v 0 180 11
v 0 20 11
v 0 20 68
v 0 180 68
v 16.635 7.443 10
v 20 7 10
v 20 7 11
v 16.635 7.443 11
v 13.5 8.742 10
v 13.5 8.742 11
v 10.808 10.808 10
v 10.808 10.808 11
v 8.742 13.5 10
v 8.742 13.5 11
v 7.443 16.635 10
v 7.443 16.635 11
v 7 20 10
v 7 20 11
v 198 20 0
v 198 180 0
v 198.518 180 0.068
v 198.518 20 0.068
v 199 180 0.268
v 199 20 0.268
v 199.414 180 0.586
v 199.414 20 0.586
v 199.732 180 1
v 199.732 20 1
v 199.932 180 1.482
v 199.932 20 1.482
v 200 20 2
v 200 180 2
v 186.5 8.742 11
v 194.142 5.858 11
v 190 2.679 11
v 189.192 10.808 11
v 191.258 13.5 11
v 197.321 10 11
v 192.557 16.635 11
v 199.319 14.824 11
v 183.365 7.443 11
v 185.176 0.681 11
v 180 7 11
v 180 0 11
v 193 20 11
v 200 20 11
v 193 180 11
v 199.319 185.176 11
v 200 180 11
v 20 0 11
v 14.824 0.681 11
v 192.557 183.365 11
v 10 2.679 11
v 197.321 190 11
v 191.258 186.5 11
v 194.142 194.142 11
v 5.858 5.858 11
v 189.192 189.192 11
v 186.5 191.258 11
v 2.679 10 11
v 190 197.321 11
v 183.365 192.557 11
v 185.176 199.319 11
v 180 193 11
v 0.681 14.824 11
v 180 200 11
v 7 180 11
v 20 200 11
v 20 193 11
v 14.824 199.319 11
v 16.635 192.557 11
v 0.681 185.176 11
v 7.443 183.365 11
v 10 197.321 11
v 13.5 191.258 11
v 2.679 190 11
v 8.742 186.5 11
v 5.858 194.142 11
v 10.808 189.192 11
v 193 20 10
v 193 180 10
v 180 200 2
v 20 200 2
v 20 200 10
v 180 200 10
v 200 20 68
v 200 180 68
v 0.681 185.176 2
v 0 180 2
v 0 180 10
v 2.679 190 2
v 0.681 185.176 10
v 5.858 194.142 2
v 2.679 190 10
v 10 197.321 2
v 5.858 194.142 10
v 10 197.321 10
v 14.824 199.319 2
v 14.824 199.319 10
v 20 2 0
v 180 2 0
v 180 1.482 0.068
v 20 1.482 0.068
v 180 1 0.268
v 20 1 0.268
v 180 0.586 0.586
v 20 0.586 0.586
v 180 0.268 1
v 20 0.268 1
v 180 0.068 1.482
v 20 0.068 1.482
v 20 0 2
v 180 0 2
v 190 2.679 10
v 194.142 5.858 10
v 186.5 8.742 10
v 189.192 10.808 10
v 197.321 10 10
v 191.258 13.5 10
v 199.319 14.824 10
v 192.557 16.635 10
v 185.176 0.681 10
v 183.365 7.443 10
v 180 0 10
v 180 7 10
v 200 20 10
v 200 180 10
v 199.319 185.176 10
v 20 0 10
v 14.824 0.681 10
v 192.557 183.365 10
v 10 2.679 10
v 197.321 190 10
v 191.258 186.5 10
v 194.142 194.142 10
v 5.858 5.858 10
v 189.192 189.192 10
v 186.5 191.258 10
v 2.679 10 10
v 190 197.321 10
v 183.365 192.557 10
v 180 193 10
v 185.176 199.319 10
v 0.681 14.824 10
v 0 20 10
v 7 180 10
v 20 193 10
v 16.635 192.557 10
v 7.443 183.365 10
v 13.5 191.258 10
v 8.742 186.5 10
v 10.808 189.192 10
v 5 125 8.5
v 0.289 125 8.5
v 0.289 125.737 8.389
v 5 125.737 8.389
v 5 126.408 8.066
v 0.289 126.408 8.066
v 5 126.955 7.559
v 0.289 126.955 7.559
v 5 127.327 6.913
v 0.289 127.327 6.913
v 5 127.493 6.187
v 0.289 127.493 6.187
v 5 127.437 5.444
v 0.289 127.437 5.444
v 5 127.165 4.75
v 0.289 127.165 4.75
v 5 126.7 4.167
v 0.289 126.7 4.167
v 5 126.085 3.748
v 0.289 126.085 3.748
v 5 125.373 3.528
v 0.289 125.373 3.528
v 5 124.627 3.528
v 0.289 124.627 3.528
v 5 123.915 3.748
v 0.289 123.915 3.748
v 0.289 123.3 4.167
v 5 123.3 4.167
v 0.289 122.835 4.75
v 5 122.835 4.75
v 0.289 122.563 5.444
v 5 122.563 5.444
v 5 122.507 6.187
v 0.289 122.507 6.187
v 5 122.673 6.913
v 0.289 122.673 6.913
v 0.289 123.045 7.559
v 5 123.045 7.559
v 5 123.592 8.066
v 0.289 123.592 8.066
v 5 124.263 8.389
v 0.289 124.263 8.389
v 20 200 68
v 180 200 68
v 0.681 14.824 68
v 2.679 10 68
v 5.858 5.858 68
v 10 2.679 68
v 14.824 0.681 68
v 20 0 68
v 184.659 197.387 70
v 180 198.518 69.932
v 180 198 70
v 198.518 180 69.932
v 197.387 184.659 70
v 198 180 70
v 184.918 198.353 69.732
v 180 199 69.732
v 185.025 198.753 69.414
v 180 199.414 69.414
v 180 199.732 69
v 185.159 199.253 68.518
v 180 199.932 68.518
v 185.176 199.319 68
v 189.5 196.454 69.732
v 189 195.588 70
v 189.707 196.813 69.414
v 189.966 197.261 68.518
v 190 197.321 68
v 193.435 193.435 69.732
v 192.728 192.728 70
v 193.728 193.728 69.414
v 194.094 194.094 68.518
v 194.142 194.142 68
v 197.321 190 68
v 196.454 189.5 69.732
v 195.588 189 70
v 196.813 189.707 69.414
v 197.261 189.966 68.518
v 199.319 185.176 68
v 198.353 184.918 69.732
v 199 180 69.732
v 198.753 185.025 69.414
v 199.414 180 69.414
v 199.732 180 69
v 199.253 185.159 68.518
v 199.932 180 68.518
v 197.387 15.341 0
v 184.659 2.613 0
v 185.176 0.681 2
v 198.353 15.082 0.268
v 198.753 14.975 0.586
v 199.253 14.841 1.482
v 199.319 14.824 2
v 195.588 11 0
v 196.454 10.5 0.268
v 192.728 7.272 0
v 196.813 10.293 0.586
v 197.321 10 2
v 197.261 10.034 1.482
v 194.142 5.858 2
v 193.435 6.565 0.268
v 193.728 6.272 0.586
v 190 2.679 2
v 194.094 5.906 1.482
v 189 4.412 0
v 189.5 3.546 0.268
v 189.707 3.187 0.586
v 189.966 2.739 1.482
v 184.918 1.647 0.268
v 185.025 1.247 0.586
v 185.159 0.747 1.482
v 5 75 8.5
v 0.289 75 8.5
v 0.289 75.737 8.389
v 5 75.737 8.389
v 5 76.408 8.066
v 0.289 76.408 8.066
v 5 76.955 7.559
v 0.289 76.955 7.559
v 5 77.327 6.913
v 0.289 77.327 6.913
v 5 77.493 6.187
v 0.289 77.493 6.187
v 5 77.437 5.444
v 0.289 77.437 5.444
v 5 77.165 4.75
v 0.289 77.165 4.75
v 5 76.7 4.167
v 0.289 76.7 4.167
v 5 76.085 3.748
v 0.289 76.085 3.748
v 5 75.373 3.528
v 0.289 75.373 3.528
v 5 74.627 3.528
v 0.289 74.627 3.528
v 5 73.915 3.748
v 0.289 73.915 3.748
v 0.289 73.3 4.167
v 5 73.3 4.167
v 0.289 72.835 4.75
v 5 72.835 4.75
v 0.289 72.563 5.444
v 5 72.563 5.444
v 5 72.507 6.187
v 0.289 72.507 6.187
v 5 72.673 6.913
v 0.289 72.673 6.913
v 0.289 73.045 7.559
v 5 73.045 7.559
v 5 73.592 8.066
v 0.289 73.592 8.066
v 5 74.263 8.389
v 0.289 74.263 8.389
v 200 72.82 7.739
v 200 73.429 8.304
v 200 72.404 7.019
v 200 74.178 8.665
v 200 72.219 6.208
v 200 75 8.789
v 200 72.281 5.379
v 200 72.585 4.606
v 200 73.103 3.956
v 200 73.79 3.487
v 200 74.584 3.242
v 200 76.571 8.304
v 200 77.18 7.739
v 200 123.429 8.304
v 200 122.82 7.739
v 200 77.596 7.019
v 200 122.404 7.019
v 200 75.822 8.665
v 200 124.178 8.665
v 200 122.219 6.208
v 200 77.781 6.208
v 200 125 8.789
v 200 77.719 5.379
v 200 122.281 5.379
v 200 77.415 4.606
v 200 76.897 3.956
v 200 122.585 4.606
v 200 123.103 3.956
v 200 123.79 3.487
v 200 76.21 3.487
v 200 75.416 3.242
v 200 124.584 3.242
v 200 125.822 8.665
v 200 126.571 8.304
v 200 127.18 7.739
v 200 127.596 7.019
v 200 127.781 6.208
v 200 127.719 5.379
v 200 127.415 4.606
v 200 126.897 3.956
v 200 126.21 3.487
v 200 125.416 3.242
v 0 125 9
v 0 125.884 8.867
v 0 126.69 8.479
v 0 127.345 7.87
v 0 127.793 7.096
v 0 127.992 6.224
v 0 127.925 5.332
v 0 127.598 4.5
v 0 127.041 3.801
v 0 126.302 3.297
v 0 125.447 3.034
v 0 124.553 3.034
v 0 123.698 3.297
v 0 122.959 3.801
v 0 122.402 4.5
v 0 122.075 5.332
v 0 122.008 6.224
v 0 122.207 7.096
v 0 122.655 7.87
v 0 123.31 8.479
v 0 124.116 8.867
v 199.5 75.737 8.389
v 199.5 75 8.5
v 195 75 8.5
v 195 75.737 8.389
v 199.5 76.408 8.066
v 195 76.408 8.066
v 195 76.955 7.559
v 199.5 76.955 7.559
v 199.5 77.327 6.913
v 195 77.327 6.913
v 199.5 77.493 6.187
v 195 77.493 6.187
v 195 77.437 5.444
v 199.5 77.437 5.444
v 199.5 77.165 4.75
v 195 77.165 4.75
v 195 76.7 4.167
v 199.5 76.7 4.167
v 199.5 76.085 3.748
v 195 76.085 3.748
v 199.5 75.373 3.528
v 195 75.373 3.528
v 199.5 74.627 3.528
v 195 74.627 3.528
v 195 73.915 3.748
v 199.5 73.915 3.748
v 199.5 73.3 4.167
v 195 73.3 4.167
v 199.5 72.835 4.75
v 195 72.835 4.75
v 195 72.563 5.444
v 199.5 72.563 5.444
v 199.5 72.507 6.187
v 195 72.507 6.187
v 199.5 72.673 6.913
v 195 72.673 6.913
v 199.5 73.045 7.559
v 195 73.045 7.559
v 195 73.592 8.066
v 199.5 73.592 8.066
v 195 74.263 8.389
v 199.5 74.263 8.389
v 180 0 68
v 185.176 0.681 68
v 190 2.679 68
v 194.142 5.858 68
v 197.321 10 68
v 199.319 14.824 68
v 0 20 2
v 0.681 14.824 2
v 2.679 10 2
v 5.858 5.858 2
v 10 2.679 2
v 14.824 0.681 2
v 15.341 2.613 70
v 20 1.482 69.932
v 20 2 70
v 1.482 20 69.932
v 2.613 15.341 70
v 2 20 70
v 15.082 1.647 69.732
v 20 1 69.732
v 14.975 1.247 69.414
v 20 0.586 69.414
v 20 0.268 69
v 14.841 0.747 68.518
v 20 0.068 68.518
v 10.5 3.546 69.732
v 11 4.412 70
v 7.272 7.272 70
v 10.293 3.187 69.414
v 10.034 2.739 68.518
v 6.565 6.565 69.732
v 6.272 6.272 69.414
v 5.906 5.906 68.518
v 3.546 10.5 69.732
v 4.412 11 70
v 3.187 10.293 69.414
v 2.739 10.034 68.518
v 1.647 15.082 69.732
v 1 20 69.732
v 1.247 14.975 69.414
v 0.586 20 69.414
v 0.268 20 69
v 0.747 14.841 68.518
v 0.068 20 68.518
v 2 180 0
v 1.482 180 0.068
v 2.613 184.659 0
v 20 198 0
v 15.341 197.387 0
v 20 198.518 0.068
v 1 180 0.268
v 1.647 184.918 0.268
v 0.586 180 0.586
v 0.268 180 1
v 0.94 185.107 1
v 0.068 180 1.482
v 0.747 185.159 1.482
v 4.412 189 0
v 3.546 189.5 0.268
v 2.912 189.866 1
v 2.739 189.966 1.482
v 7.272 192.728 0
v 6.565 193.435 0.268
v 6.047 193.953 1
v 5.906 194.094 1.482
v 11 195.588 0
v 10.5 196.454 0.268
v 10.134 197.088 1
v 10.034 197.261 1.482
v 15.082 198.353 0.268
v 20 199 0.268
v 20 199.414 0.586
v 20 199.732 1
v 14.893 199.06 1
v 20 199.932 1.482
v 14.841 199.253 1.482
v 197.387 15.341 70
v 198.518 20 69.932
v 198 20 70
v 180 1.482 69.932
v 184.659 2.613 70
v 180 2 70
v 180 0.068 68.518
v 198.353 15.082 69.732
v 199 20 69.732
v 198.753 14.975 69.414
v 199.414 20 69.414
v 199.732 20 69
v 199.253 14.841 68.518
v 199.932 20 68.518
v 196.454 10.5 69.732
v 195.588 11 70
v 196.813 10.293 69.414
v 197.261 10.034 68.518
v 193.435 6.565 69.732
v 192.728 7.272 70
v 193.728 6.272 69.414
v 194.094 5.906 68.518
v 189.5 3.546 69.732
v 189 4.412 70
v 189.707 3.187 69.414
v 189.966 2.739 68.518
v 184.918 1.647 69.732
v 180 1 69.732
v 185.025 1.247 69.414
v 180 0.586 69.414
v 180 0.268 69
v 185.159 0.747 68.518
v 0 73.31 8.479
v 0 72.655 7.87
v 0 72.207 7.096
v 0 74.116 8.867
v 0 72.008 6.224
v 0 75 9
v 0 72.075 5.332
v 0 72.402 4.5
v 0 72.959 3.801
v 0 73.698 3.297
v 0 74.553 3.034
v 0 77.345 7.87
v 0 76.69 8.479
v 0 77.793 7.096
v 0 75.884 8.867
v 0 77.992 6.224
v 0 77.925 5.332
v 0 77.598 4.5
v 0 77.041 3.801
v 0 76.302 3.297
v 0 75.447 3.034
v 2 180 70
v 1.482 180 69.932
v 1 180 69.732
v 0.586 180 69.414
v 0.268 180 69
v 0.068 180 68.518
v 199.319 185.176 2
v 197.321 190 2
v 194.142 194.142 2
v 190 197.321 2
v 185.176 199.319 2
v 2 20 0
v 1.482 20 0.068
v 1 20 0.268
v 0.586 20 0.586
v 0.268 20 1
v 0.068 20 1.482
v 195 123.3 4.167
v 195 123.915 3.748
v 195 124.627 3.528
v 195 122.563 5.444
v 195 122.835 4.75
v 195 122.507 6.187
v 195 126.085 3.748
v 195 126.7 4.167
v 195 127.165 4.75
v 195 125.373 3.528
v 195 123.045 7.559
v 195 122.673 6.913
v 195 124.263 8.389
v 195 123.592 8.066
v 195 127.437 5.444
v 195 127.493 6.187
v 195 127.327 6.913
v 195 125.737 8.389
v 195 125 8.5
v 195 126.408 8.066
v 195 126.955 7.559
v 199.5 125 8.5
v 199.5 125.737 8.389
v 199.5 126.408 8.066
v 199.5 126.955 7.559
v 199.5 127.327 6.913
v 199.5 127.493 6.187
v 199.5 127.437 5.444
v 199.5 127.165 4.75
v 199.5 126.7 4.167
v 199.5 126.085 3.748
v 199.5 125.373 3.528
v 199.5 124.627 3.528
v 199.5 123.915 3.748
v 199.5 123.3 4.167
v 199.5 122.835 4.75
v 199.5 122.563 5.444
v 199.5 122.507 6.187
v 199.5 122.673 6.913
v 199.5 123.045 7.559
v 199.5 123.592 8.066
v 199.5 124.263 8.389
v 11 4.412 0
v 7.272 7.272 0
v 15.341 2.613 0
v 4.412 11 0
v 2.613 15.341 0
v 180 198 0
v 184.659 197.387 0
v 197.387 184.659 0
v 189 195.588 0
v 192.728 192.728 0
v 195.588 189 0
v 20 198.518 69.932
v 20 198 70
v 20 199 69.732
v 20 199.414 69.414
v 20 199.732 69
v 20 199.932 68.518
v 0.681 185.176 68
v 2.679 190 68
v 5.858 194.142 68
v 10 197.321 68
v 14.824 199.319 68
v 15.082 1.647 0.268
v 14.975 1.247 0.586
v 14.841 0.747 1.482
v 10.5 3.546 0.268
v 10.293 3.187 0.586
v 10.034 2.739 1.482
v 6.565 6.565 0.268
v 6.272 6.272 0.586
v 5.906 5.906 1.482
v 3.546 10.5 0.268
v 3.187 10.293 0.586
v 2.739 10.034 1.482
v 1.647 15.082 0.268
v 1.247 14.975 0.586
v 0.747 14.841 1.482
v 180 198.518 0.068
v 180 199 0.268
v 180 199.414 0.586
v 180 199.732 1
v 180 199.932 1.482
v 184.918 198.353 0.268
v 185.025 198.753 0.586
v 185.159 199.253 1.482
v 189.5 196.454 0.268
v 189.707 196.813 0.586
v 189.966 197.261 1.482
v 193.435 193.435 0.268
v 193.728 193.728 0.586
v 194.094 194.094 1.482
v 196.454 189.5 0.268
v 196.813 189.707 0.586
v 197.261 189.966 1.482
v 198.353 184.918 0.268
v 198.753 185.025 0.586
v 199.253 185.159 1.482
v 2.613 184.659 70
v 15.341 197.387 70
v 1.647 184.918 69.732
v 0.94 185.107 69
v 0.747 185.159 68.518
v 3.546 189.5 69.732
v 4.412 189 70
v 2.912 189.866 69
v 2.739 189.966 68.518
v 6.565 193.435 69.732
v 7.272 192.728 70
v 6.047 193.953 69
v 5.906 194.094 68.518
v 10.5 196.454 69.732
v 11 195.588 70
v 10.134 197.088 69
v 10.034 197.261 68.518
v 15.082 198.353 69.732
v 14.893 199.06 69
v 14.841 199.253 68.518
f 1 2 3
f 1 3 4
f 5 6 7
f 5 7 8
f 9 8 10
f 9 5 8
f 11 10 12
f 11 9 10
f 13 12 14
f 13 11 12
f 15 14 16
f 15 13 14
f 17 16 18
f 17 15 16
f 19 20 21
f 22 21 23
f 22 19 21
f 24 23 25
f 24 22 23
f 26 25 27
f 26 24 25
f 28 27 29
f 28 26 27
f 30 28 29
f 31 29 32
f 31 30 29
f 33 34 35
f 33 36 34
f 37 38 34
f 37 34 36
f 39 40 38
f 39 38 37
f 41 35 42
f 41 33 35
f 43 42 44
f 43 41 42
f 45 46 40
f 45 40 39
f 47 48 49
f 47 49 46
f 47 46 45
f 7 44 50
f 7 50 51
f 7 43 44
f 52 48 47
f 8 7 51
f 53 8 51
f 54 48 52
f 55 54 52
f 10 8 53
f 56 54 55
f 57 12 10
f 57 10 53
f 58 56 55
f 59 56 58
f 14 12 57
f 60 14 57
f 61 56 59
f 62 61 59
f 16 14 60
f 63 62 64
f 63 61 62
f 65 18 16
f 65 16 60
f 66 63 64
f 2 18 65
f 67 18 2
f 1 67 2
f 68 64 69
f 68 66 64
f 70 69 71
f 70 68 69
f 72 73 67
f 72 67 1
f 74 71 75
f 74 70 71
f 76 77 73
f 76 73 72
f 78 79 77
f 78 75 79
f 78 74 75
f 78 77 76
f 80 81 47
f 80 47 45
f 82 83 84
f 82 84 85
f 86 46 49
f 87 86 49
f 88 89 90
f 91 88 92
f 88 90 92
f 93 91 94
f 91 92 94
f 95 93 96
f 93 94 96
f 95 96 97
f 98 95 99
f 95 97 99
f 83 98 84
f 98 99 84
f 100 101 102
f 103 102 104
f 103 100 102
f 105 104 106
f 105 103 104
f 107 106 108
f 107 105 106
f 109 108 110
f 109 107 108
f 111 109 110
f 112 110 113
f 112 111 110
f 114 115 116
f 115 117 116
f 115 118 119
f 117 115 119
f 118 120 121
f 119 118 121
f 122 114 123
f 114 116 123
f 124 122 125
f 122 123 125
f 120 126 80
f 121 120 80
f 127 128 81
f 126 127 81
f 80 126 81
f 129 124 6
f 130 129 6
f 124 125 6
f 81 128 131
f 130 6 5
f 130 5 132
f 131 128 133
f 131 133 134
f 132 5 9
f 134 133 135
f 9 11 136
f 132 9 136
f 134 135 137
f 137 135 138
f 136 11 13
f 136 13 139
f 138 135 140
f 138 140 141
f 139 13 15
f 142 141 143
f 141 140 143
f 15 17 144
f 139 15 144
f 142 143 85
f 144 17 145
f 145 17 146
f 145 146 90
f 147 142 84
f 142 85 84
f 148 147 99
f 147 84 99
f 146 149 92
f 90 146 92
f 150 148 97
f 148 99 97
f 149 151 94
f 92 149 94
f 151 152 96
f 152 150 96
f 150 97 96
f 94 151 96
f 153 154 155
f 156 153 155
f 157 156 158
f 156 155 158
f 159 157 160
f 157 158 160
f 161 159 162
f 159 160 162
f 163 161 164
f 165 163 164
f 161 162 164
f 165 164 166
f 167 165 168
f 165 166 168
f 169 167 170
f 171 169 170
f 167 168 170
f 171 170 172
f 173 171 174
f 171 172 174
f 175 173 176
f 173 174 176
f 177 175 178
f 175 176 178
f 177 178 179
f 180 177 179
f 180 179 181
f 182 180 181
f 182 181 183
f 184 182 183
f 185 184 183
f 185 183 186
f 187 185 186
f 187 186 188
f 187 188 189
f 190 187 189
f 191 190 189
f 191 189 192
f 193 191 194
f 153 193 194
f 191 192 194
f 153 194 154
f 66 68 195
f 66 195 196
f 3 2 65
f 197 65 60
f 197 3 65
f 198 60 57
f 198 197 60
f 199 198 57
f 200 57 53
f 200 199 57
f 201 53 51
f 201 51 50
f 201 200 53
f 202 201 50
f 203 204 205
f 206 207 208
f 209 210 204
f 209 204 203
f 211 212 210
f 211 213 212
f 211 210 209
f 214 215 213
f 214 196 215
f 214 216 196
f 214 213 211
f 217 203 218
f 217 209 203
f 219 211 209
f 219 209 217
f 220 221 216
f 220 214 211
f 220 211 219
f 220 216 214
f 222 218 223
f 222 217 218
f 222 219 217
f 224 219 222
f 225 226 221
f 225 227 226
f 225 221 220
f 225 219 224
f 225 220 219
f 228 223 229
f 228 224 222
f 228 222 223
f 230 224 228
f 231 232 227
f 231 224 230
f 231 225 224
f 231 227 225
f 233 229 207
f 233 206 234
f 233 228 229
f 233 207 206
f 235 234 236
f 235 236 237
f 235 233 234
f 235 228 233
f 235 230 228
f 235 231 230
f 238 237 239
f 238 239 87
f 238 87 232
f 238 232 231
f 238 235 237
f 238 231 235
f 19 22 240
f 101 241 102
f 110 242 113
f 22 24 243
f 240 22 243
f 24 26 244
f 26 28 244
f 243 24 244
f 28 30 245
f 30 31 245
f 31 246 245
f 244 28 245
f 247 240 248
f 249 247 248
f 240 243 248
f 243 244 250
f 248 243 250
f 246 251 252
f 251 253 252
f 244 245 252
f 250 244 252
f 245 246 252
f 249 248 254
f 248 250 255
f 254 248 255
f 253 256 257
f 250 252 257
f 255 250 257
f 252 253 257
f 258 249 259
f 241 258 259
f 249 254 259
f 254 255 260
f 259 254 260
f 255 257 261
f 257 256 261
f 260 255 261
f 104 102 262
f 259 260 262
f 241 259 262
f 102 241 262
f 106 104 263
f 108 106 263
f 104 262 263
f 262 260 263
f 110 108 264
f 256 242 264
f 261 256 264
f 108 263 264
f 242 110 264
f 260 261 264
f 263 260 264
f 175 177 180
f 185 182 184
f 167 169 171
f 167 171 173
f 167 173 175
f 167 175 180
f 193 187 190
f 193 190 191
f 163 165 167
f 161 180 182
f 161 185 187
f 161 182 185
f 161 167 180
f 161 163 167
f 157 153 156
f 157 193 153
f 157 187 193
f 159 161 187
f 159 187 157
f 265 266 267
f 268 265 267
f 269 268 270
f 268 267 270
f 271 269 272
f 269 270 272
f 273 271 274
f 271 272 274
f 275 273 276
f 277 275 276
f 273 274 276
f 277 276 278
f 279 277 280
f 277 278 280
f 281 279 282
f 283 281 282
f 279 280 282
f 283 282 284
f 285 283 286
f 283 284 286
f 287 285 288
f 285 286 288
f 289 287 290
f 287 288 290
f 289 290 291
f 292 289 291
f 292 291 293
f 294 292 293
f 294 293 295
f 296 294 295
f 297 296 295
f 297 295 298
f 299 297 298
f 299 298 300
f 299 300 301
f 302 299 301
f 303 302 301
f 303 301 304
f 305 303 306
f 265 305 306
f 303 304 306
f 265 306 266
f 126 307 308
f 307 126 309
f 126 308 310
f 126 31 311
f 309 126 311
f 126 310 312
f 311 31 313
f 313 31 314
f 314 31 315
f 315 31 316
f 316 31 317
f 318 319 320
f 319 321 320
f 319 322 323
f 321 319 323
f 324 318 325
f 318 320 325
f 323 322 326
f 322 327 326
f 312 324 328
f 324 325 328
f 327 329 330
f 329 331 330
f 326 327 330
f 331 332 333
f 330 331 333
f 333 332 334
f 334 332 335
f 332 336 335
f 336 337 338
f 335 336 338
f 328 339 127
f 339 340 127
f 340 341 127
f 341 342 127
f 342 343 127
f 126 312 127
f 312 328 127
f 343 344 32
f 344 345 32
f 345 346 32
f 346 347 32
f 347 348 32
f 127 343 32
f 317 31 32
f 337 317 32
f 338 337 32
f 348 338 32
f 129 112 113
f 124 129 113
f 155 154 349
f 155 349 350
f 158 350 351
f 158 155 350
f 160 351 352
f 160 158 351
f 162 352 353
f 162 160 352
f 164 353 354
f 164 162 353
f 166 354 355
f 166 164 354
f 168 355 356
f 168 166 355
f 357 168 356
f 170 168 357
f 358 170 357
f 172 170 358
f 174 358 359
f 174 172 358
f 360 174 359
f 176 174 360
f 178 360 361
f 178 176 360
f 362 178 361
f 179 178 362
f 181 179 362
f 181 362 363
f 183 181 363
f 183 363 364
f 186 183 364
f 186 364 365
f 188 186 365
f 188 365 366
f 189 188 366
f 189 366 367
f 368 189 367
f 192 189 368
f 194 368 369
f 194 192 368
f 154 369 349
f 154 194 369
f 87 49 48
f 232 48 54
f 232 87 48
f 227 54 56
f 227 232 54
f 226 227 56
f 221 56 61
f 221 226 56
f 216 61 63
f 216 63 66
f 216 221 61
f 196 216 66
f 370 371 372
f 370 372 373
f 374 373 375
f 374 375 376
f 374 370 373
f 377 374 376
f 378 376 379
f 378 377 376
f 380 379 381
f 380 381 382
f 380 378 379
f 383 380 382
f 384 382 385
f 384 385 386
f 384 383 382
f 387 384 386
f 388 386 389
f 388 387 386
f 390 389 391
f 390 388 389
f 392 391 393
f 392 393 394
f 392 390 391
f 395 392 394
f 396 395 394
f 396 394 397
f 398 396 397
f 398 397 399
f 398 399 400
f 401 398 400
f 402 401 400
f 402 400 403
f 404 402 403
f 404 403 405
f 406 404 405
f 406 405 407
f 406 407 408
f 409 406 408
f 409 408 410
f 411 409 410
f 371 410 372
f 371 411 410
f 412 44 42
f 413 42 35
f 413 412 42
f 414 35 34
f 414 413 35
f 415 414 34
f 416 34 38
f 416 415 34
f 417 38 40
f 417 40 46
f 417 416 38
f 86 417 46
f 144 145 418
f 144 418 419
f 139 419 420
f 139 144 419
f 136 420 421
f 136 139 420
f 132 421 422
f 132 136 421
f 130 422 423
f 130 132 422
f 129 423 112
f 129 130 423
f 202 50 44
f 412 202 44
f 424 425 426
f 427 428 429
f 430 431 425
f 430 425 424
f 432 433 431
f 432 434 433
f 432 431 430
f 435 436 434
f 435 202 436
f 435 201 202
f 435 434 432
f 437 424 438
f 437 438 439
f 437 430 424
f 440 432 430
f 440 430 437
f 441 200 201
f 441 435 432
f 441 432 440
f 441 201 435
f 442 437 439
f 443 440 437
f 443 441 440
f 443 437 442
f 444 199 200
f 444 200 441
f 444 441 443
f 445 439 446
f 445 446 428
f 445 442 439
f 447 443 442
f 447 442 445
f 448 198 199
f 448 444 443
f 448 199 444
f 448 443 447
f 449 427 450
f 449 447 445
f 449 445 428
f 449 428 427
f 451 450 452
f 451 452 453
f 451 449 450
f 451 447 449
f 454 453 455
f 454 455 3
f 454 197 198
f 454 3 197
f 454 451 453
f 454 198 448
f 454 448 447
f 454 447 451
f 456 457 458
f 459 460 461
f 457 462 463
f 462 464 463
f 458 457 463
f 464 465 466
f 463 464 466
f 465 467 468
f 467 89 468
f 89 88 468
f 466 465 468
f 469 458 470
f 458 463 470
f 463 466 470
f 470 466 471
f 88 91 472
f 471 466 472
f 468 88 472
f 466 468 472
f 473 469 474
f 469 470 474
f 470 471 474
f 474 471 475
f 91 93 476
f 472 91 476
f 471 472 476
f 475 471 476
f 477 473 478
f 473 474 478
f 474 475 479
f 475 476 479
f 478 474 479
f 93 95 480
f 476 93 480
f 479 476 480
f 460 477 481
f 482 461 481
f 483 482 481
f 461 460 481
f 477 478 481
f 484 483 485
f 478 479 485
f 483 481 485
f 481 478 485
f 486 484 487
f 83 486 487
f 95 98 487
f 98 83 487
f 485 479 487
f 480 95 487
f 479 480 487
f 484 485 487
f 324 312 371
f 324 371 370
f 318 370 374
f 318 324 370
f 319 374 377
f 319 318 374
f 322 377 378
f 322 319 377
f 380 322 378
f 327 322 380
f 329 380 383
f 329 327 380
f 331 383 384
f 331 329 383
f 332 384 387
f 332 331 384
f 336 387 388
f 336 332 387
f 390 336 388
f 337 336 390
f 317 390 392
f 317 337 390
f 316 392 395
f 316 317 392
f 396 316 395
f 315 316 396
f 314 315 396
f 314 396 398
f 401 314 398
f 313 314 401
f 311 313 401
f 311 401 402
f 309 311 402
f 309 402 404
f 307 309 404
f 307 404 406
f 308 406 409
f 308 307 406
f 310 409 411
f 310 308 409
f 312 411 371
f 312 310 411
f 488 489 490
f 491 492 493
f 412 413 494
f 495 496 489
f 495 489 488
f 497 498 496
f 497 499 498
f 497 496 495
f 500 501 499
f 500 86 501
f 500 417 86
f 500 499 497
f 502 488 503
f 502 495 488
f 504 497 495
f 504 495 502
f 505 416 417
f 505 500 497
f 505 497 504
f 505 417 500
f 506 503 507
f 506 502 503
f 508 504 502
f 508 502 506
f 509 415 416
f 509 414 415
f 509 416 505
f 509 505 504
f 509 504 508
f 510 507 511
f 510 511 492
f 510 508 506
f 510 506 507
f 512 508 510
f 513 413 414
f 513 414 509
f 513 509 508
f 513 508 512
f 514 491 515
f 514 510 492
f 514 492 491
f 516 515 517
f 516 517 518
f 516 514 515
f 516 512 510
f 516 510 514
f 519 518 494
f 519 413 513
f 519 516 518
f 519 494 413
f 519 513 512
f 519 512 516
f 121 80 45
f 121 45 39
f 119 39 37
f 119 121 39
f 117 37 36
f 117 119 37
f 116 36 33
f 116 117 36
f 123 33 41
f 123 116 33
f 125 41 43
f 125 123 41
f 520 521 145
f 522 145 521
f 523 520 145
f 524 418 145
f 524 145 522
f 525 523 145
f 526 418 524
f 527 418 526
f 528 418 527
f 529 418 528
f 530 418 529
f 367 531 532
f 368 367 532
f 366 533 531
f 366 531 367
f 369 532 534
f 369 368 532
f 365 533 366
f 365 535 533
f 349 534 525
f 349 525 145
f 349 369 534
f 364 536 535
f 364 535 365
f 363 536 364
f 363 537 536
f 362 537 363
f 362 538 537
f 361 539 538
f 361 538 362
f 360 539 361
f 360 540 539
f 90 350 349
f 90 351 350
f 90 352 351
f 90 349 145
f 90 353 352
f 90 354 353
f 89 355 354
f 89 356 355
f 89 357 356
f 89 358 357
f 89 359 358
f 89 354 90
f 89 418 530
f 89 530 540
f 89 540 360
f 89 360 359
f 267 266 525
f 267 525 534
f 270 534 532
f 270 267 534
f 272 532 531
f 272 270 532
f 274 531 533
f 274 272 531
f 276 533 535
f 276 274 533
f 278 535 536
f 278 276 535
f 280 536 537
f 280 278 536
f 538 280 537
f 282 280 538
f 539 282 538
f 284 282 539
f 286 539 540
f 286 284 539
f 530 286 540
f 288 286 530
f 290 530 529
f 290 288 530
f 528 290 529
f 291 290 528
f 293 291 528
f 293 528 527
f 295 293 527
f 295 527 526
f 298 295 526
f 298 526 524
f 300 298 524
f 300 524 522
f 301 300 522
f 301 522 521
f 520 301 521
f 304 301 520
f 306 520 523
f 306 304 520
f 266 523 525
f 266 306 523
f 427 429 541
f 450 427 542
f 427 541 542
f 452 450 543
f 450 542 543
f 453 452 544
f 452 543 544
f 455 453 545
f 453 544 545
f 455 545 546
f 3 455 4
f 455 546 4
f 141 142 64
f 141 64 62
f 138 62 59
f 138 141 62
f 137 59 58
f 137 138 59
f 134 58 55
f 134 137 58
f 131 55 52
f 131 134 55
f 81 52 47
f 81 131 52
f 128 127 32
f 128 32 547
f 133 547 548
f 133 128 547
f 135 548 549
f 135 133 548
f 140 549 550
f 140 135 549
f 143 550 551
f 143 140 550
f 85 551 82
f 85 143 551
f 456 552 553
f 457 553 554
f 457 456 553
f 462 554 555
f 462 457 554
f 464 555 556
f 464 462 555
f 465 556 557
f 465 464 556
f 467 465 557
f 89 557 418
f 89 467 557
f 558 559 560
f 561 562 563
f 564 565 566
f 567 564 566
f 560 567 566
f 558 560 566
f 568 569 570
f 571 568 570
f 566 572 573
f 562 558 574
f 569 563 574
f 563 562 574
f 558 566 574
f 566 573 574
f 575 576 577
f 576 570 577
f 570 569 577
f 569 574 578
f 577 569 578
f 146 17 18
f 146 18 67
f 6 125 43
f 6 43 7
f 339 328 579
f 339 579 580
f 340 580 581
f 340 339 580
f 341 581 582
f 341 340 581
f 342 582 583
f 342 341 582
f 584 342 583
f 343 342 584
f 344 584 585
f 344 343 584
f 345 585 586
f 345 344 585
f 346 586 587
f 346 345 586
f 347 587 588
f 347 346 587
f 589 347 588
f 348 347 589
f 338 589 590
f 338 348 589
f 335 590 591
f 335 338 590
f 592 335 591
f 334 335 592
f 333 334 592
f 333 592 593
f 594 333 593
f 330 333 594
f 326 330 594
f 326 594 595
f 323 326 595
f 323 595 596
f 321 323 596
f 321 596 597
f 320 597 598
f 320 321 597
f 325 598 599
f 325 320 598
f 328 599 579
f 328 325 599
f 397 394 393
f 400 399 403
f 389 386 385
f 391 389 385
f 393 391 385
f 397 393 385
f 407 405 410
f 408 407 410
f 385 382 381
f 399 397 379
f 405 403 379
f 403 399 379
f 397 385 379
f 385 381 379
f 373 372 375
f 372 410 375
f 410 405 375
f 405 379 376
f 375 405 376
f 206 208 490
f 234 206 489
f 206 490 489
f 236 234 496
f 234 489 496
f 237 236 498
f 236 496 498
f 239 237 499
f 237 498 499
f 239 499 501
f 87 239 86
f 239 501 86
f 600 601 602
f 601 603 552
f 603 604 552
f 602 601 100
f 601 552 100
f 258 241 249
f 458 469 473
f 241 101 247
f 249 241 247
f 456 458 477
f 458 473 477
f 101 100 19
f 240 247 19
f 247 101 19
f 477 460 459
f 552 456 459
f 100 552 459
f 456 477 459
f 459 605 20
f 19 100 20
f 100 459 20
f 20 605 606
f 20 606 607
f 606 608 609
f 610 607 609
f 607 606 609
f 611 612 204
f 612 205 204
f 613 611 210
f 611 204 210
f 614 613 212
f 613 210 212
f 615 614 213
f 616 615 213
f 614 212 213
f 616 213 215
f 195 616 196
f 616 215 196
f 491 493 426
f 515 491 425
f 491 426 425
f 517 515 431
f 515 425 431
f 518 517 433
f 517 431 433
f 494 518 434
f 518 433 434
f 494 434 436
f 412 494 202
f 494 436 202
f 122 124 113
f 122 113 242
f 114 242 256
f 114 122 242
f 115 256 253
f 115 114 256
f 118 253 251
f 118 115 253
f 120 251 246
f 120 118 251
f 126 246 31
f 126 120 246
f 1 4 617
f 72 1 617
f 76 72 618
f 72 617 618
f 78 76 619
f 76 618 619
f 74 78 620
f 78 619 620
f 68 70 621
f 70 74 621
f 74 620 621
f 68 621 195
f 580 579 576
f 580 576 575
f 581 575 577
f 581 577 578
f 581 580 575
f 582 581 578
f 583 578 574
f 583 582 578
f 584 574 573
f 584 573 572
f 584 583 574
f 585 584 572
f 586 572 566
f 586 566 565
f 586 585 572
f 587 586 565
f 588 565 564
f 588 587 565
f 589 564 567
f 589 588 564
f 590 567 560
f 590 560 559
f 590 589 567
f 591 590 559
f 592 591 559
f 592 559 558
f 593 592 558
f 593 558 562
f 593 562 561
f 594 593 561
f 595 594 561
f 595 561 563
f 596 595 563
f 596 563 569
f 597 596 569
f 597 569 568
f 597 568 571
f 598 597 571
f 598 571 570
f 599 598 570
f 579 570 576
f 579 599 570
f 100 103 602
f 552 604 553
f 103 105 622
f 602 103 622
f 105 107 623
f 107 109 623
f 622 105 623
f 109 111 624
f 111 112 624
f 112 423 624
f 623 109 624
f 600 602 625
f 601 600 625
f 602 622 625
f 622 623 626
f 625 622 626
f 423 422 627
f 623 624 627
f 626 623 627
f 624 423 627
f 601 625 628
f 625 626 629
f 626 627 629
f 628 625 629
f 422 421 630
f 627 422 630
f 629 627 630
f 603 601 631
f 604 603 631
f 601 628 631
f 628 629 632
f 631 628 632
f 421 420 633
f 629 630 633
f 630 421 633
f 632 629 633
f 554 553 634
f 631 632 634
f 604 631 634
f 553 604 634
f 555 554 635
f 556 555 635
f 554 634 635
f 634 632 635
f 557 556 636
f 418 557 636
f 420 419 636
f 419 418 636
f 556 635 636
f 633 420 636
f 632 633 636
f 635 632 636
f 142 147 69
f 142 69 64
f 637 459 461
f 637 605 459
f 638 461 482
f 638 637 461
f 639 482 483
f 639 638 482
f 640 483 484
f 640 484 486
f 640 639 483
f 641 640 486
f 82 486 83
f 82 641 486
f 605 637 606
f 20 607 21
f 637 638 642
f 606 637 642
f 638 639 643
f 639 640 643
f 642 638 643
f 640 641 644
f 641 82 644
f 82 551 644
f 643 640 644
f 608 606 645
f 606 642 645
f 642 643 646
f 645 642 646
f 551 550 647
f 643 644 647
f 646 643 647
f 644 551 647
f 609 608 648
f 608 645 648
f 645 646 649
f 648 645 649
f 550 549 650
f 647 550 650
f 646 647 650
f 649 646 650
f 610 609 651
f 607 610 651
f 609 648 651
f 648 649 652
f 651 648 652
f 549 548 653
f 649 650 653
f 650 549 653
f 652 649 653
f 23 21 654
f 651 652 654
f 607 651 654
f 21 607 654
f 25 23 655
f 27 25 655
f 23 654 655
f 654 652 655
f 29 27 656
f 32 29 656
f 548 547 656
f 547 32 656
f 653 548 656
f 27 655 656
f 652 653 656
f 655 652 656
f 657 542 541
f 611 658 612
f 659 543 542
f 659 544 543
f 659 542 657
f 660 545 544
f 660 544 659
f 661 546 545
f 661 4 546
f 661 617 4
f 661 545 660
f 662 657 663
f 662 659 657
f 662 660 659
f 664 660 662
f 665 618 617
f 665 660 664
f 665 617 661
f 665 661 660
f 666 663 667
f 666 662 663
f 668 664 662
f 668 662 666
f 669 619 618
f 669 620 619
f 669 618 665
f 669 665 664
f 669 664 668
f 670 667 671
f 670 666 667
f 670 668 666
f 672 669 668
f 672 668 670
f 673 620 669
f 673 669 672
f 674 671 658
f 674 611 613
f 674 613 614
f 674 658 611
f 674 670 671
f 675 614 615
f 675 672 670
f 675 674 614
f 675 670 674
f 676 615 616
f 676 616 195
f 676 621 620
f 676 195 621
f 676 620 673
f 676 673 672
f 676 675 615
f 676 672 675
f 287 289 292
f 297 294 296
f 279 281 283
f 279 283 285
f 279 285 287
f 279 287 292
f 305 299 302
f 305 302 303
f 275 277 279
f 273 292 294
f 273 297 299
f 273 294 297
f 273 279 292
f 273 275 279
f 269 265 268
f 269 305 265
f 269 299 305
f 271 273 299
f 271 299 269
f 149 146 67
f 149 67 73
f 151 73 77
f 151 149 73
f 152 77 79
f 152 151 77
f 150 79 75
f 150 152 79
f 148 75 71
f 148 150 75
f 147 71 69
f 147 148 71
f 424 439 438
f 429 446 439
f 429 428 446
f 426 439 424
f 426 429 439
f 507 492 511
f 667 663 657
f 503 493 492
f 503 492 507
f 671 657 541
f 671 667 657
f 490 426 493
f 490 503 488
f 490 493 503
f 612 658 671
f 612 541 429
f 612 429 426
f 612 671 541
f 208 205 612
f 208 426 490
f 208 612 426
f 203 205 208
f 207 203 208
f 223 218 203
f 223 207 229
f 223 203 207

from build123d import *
from OCP.BRepFilletAPI import BRepFilletAPI_MakeChamfer

# Parameters (mm, degrees)
SKETCH1_W           = 200
SKETCH1_H           = 200
BOSS_EXTRUDE1_DEPTH = 70
FILLET1_R           = 20
FILLET2_R           = 2
SKETCH2_W           = 230.455547831
SKETCH2_H           = 230.807926345
CUT_EXTRUDE1_DEPTH  = 1
SKETCH3_R           = 2.5
CUT_EXTRUDE2_DEPTH  = 5
CHAMFER1_SIZE       = 0.5
CHAMFER1_SIZE2      = 0.288675135
CHAMFER2_SIZE       = 0.5
CHAMFER2_SIZE2      = 0.288675135


with BuildPart() as part:
    # Sketch1 → Boss-Extrude1 (new body)
    with BuildSketch(Plane.XY):
        with Locations((100, 100)):
            Rectangle(SKETCH1_W, SKETCH1_H)
    extrude(amount=BOSS_EXTRUDE1_DEPTH)

    # Fillet1
    fillet1_edges = [part.edges().sort_by_distance(p)[0] for p in [
        (0, 0, 35),
        (200, 0, 35),
        (200, 200, 35),
        (0, 200, 35),
    ]]
    fillet(fillet1_edges, radius=FILLET1_R)

    # Fillet2
    fillet2_edges = [part.edges().sort_by_distance(p)[0] for p in [
        (100, 200, 0),
        (100, 200, 70),
        (0, 100, 0),
        (200, 100, 0),
        (100, 0, 0),
        (5.857864376, 5.857864376, 0),
        (5.857864376, 194.142135624, 0),
        (194.142135624, 5.857864376, 0),
        (194.142135624, 194.142135624, 0),
        (200, 100, 70),
        (0, 100, 70),
        (100, 0, 70),
        (5.857864376, 5.857864376, 70),
        (5.857864376, 194.142135624, 70),
        (194.142135624, 5.857864376, 70),
        (194.142135624, 194.142135624, 70),
    ]]
    fillet(fillet2_edges, radius=FILLET2_R)

    # Sketch2 → Cut-Extrude1 (cut)
    with BuildSketch(Plane(origin=(0, 0, 10), x_dir=(-1, 0, 0), z_dir=(0, 0, -1))):
        with Locations((-100.412379168, 99.554731442)):
            Rectangle(SKETCH2_W, SKETCH2_H)
        with BuildLine():
            Line((-7, 20), (-7, 180))
            ThreePointArc((-7, 180), (-10.807611845, 189.192388155), (-20, 193))
            Line((-20, 193), (-180, 193))
            ThreePointArc((-180, 193), (-189.192388155, 189.192388155), (-193, 180))
            Line((-193, 180), (-193, 20))
            ThreePointArc((-193, 20), (-189.192388155, 10.807611845), (-180, 7))
            Line((-180, 7), (-20, 7))
            ThreePointArc((-20, 7), (-10.807611845, 10.807611845), (-7, 20))
        make_face(mode=Mode.SUBTRACT)
    extrude(amount=-CUT_EXTRUDE1_DEPTH, mode=Mode.SUBTRACT)

    # Sketch3 → Cut-Extrude2 (cut)
    with BuildSketch(Plane.ZY):
        with Locations((6, 125)):
            Circle(SKETCH3_R)
        with Locations((6, 75)):
            Circle(SKETCH3_R)
    cut_extrude2 = extrude(amount=-CUT_EXTRUDE2_DEPTH, mode=Mode.SUBTRACT)

    # Chamfer1
    chamfer1_edges = [part.edges().sort_by_distance(p)[0] for p in [
        (0, 125, 3.5),
        (0, 75, 3.5),
    ]]
    chamfer1_side = [part.faces().sort_by_distance(p)[0] for p in [
        (0, 100, 6),
    ]]
    chamfer(chamfer1_edges, length=CHAMFER1_SIZE, length2=CHAMFER1_SIZE2, reference=chamfer1_side[0])

    # Mirror2: Cut-Extrude2 across plane
    add(cut_extrude2.mirror(Plane.ZY.offset(-100)), mode=Mode.SUBTRACT)

    # Chamfer2: one chamfer whose edges measure the first distance from different faces: ONE call of the kernel's chamfer builder (chamfer() names one face for all edges)
    chamfer2_edges_1 = [part.edges().sort_by_distance(p)[0] for p in [
        (200, 125, 3.5),
    ]]
    chamfer2_side_1 = [part.faces().sort_by_distance(p)[0] for p in [
        (197.5, 125, 3.5),
    ]]
    chamfer2_edges_2 = [part.edges().sort_by_distance(p)[0] for p in [
        (200, 75, 3.5),
    ]]
    chamfer2_side_2 = [part.faces().sort_by_distance(p)[0] for p in [
        (197.5, 75, 3.5),
    ]]
    chamfer2 = BRepFilletAPI_MakeChamfer(part.part.solid().wrapped)
    for e in chamfer2_edges_1:
        chamfer2.Add(CHAMFER2_SIZE, CHAMFER2_SIZE2, e.wrapped, chamfer2_side_1[0].wrapped)  # the first distance lies on this face
    for e in chamfer2_edges_2:
        chamfer2.Add(CHAMFER2_SIZE, CHAMFER2_SIZE2, e.wrapped, chamfer2_side_2[0].wrapped)  # the first distance lies on this face
    add(Compound.cast(chamfer2.Shape()), mode=Mode.REPLACE)


solid = part.part
